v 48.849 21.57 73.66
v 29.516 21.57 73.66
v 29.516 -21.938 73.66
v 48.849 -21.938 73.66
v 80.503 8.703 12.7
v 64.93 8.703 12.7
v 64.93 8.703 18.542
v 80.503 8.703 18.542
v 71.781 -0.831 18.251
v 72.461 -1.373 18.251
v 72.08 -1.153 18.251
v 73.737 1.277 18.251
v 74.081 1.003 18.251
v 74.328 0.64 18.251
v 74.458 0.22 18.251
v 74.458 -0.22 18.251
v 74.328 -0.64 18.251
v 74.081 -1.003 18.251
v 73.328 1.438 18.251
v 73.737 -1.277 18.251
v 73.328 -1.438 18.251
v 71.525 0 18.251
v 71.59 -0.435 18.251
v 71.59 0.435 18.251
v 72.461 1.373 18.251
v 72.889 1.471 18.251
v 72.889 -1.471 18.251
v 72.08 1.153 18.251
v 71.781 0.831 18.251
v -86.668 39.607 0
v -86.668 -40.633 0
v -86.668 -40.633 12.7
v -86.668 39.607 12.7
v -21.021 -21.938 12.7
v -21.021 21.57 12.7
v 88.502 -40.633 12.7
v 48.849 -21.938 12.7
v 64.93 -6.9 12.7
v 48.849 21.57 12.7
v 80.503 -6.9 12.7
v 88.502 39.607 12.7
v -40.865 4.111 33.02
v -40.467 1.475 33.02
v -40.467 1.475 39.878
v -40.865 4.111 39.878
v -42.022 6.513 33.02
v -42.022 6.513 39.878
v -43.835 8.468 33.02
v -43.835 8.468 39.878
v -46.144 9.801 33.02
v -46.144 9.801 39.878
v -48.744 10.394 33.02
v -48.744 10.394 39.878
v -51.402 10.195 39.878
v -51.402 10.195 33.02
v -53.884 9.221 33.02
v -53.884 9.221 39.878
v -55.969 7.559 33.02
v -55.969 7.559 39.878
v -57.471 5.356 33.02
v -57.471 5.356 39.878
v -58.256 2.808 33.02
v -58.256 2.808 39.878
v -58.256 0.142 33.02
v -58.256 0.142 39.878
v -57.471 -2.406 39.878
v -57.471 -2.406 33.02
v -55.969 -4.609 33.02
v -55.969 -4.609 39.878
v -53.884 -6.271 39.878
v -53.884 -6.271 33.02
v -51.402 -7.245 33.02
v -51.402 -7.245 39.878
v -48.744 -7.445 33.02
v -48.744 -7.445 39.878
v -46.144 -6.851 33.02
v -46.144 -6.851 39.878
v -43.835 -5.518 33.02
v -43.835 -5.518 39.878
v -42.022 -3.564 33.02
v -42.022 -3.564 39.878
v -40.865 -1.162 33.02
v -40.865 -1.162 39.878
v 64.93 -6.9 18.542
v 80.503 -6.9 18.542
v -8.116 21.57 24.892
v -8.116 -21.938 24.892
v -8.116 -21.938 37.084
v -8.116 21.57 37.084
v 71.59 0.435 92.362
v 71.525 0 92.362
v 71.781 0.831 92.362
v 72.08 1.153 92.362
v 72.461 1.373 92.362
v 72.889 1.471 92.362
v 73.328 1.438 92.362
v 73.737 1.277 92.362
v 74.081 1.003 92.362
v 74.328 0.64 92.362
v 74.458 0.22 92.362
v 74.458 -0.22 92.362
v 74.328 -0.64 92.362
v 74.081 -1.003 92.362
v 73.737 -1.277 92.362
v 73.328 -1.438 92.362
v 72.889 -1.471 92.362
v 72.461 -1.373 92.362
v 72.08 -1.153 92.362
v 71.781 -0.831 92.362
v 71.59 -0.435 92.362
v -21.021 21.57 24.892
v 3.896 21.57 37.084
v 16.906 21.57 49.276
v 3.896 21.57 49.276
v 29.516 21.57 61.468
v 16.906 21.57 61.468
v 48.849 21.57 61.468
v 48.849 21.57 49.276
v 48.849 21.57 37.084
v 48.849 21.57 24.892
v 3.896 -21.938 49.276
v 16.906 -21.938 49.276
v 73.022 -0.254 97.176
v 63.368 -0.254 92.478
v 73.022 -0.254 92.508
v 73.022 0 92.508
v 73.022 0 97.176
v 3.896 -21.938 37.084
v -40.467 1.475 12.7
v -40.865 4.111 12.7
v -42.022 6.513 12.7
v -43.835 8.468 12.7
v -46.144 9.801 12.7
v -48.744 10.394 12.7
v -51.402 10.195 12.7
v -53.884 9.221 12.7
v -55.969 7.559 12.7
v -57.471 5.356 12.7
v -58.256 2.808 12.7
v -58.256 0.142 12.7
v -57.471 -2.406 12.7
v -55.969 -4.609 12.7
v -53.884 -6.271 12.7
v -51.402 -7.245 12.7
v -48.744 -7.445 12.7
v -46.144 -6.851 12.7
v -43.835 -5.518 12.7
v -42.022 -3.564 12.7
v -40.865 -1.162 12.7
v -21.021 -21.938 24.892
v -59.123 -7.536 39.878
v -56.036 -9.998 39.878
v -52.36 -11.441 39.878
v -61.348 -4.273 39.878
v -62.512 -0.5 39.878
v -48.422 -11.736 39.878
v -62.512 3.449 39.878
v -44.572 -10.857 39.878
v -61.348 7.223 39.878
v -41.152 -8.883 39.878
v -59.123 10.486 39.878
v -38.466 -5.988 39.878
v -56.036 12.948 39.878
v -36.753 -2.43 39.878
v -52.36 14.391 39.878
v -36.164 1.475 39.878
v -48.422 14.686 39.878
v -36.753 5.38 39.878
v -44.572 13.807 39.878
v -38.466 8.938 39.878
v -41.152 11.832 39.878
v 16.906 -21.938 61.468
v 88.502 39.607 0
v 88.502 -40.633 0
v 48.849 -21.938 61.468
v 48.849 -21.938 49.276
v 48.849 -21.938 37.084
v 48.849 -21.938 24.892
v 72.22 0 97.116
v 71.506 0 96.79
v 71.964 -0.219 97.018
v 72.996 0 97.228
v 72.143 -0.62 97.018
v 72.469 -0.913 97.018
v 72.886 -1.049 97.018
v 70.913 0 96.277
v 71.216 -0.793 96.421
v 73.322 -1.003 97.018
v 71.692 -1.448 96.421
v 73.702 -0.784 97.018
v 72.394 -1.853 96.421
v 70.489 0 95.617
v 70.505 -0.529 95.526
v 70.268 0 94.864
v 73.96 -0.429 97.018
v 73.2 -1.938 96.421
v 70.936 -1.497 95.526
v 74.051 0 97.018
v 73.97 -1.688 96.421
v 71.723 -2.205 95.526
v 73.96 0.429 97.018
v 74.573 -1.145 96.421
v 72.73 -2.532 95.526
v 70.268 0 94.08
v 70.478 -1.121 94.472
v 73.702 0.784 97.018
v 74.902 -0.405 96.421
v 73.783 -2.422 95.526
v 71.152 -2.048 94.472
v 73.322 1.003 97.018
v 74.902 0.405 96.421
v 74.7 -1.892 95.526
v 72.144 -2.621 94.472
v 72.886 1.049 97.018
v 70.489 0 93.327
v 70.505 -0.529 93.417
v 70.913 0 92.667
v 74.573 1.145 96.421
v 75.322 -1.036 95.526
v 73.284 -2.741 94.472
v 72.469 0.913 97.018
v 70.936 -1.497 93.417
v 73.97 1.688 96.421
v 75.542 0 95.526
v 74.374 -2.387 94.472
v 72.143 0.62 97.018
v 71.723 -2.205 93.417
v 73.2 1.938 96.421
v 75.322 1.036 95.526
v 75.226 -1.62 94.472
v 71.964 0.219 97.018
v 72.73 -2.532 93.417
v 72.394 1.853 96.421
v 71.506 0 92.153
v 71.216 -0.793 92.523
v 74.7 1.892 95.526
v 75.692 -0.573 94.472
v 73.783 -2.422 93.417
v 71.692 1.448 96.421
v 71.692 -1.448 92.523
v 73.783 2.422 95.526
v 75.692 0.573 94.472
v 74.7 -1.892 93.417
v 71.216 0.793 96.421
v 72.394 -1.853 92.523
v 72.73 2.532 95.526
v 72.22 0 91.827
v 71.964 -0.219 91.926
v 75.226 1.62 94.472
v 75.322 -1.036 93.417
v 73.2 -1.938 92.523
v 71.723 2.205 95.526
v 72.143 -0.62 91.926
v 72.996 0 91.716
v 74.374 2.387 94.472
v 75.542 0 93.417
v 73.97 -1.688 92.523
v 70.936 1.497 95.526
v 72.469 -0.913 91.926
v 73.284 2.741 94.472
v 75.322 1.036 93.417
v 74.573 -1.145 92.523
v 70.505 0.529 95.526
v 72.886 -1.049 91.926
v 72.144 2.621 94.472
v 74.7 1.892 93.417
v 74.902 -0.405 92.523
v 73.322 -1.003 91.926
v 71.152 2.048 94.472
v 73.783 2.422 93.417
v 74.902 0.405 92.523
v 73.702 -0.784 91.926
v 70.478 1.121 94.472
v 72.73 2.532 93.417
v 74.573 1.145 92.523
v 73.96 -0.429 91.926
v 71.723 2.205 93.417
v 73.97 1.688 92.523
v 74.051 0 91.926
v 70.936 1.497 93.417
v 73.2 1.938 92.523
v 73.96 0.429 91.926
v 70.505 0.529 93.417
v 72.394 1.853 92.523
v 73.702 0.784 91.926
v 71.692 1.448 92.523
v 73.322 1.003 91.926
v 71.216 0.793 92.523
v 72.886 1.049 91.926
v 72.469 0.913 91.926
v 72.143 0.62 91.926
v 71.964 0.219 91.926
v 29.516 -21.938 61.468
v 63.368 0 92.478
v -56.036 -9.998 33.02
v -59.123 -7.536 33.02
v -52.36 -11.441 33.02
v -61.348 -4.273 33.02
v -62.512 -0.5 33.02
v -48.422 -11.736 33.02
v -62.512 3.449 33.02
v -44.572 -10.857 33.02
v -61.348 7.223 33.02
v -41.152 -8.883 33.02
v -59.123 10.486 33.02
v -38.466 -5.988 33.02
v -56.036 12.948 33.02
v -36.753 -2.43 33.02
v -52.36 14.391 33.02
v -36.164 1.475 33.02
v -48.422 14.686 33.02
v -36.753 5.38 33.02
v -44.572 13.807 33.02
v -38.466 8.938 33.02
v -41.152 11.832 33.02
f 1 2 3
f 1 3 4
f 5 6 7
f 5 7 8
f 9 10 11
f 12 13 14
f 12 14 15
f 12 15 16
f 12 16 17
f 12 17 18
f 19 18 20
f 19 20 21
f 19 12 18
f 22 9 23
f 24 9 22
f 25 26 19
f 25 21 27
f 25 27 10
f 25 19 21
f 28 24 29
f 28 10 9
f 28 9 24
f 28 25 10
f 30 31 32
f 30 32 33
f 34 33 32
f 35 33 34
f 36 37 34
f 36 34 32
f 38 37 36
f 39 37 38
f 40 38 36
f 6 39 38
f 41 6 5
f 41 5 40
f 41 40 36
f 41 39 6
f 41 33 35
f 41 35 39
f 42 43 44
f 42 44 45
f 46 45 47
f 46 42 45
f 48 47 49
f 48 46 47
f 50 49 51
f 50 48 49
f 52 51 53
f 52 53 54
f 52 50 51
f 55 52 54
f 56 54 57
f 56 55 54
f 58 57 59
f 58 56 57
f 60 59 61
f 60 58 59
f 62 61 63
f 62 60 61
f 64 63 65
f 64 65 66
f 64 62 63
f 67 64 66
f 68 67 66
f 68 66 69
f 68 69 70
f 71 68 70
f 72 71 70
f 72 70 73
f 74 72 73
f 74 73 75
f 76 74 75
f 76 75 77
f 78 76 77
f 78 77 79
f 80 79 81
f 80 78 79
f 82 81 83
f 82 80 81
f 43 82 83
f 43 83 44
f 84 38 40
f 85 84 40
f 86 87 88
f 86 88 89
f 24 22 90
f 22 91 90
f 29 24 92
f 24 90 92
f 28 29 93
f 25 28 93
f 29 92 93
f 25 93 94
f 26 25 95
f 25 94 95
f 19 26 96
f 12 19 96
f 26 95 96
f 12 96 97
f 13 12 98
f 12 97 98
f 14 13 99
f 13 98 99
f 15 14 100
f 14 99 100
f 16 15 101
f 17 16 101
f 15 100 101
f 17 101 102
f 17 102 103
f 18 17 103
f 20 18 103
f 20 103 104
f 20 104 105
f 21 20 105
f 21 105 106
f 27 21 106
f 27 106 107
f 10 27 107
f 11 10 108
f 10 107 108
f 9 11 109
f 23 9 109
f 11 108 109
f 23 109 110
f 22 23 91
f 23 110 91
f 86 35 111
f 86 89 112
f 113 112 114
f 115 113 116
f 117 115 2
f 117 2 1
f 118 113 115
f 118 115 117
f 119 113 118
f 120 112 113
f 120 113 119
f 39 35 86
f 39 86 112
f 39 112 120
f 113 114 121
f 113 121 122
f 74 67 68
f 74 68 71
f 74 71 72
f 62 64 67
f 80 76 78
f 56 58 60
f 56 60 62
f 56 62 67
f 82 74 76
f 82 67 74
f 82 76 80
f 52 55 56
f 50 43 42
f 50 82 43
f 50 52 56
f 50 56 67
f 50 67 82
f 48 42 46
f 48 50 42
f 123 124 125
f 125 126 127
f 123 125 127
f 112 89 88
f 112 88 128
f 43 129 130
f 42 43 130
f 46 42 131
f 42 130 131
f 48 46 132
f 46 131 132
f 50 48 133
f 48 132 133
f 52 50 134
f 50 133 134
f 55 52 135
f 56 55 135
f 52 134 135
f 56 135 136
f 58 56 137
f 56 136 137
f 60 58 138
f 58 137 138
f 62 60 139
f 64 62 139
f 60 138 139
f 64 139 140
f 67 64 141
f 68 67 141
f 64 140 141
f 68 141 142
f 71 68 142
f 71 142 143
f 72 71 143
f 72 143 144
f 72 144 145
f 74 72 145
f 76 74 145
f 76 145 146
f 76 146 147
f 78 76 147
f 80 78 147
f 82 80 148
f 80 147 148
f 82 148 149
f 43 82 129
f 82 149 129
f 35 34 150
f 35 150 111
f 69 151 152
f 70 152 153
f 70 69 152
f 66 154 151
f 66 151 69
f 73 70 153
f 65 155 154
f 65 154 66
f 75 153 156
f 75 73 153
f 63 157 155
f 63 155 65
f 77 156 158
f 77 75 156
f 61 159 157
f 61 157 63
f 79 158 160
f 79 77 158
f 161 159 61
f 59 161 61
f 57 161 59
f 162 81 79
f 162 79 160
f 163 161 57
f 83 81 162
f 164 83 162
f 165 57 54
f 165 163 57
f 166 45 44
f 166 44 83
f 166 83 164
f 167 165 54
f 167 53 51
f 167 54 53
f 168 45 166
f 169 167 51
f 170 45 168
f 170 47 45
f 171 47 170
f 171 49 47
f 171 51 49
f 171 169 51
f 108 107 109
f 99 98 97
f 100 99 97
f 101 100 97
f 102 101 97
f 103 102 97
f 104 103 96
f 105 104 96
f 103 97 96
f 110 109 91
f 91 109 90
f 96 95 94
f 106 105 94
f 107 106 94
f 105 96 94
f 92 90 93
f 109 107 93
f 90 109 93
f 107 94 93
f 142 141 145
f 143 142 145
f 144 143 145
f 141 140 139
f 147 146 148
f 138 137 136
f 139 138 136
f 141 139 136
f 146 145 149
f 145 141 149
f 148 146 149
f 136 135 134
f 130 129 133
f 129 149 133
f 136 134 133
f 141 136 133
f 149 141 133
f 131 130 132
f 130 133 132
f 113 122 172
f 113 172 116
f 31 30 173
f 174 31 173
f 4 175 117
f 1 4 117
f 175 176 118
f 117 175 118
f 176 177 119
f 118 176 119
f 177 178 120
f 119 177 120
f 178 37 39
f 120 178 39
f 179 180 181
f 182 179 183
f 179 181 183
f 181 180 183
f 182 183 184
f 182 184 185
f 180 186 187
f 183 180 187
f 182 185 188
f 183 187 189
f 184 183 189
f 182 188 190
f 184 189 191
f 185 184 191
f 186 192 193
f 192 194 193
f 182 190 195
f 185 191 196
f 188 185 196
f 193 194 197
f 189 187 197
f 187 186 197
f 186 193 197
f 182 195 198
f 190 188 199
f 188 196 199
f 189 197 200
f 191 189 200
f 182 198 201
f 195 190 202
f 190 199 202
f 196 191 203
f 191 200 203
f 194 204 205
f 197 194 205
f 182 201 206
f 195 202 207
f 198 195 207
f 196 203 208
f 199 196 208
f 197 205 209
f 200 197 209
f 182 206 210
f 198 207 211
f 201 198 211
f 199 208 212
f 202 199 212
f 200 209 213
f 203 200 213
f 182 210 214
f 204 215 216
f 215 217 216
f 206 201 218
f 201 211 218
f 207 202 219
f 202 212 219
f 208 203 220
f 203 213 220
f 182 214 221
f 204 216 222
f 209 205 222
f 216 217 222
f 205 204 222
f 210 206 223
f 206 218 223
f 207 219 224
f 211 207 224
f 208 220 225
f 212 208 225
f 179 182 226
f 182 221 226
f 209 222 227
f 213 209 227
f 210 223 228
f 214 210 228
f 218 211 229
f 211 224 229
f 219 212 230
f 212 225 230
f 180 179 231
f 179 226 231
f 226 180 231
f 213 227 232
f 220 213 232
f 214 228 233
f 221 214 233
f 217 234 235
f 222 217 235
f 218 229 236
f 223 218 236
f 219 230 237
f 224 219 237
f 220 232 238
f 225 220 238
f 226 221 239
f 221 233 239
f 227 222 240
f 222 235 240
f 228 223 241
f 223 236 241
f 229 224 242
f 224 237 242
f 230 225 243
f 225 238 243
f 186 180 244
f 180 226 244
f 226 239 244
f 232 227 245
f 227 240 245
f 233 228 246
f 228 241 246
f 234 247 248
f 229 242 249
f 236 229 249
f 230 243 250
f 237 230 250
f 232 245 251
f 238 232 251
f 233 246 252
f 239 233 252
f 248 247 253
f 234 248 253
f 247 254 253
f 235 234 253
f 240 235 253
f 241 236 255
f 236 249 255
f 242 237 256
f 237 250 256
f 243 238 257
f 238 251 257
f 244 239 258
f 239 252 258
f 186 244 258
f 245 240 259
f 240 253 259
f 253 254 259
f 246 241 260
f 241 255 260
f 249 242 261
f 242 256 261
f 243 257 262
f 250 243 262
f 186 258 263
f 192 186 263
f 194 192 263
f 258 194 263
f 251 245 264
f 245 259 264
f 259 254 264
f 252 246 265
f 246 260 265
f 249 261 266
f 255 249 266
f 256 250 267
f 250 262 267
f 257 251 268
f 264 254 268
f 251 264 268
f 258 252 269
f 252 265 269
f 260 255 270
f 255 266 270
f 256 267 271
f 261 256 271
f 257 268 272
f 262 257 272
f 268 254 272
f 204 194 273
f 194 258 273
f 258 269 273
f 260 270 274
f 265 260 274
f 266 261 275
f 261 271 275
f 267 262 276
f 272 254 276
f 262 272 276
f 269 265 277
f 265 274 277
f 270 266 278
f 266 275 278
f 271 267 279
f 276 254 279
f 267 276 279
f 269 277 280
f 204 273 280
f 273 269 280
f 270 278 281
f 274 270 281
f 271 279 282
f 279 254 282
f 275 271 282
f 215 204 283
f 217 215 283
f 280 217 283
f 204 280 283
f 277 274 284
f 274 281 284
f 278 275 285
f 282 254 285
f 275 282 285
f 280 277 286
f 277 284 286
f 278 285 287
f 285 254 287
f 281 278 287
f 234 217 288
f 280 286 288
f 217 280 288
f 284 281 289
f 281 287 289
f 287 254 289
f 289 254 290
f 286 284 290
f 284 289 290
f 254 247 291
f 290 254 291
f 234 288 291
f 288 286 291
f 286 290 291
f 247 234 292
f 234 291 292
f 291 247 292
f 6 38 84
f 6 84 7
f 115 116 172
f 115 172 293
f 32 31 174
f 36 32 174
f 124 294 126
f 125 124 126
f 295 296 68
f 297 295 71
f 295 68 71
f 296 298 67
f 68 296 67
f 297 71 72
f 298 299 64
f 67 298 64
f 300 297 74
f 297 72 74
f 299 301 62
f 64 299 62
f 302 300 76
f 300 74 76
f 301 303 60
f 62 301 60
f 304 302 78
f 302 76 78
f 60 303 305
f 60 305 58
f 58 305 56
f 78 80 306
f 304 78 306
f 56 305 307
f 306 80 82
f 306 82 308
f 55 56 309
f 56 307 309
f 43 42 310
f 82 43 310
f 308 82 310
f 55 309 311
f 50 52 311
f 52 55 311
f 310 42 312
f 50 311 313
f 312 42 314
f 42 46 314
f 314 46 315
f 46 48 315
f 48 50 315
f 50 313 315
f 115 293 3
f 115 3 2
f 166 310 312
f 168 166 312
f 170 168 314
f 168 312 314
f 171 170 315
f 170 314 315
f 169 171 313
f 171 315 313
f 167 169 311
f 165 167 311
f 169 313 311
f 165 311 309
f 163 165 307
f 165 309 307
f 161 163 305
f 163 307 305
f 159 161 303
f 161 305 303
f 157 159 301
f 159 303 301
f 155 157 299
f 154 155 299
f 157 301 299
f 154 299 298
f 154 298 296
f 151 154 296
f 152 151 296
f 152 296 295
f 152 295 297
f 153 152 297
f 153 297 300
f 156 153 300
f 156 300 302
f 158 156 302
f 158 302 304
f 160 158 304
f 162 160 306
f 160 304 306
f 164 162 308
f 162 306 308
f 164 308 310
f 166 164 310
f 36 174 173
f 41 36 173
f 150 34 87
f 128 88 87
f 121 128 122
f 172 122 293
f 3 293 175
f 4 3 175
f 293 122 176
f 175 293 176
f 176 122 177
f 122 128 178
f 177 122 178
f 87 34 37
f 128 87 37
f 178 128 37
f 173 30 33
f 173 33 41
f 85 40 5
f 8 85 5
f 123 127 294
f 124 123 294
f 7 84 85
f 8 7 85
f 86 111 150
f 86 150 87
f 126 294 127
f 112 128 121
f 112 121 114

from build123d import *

# Parameters (mm, degrees)
F0_W      = 175.1696318388
F0_H      = 80.2404098213
F1_DEPTH  = 12.7
F2_R      = 8.9444525912
F3_DEPTH  = 20.32
F4_R      = 13.2478255096
F4_R_2    = 8.9444525912
F5_DEPTH  = 6.858
F6_W      = 69.8704849929
F6_H      = 43.5077436268
F7_DEPTH  = 12.192
F8_W      = 56.965646334
F8_H      = 43.5077436268
F9_DEPTH  = 12.192
F10_W     = 44.9530445039
F10_H     = 43.5077436268
F11_DEPTH = 12.192
F12_W     = 31.9435857236
F12_H     = 43.5077436268
F13_DEPTH = 12.192
F14_W     = 19.3327367306
F14_H     = 43.5077436268
F15_DEPTH = 12.192
F16_W     = 15.5733302236
F16_H     = 15.6030612998
F17_DEPTH = 5.842
F18_W     = 1.4748424292
F18_H     = 74.1106420755
F23_DEPTH = 0.254


with BuildPart() as f1:
    # F0 (on Top) → F1 (new body)
    with BuildSketch(Plane.XY):
        with Locations((0.9169280529, -0.5127806216)):
            Rectangle(F0_W, F0_H)
    extrude(amount=F1_DEPTH)

    # F6 (on face) → F7 (join)
    with BuildSketch(Plane.XY.offset(12.7)):
        with Locations((13.9139452949, -0.1843553036)):
            Rectangle(F6_W, F6_H)
    extrude(amount=F7_DEPTH)

    # F8 (on face) → F9 (join)
    with BuildSketch(Plane.XY.offset(24.892)):
        with Locations((20.3663646244, -0.1843553036)):
            Rectangle(F8_W, F8_H)
    extrude(amount=F9_DEPTH)

    # F10 (on face) → F11 (join)
    with BuildSketch(Plane.XY.offset(37.084)):
        with Locations((26.3726655394, -0.1843553036)):
            Rectangle(F10_W, F10_H)
    extrude(amount=F11_DEPTH)

    # F12 (on face) → F13 (join)
    with BuildSketch(Plane.XY.offset(49.276)):
        with Locations((32.8773949295, -0.1843553036)):
            Rectangle(F12_W, F12_H)
    extrude(amount=F13_DEPTH)

    # F14 (on face) → F15 (join)
    with BuildSketch(Plane.XY.offset(61.468)):
        with Locations((39.1828194261, -0.1843553036)):
            Rectangle(F14_W, F14_H)
    extrude(amount=F15_DEPTH)

    # F16 (on face) → F17 (join)
    with BuildSketch(Plane.XY.offset(12.7)):
        with Locations((72.7165900171, 0.9013314266)):
            Rectangle(F16_W, F16_H)
    extrude(amount=F17_DEPTH)


with BuildPart() as f3:
    # F2 (on face) → F3 (new body)
    with BuildSketch(Plane.XY.offset(12.7)):
        with Locations((-49.411945045, 1.4748387039)):
            Circle(F2_R)
    extrude(amount=F3_DEPTH)


with BuildPart() as f5:
    # F4 (on face) → F5 (new body)
    with BuildSketch(Plane.XY.offset(33.02)):
        with Locations((-49.411945045, 1.4748387039)):
            Circle(F4_R)
        with Locations((-49.411945045, 1.4748387039)):
            Circle(F4_R_2, mode=Mode.SUBTRACT)
    extrude(amount=F5_DEPTH)


with BuildPart() as f19:
    # F18 (on Front) → F19 (revolve)
    with BuildSketch(Plane.XZ):
        with Locations((72.2622573376, 55.3064495325)):
            Rectangle(F18_W, F18_H)
    revolve(axis=Axis((72.9996785522, 0, 55.3064495325), (0, 0, -1)))


with BuildPart() as f21:
    # F20 (on Front) → F21 (revolve)
    with BuildSketch(Plane.XZ):
        with BuildLine():
            ThreePointArc((72.9960277677, 97.2278043628), (70.2399834991, 94.4717600942), (72.9960277677, 91.7157158256))
            Line((72.9960277677, 91.7157158256), (72.9960277677, 97.2278043628))
        make_face()
    revolve(axis=Axis((72.9960277677, 0, 94.4717600942), (0, 0, 1)))


with BuildPart() as f23:
    # F22 (on Front) → F23 (new body)
    with BuildSketch(Plane.XZ):
        Polygon((73.0219855905, 92.5079847229), (73.0219855905, 97.1758961678), (63.3675009012, 92.4784243107), align=None)
    extrude(amount=F23_DEPTH)


solid = Compound([f1.part, f3.part, f5.part, f19.part, f21.part, f23.part])
